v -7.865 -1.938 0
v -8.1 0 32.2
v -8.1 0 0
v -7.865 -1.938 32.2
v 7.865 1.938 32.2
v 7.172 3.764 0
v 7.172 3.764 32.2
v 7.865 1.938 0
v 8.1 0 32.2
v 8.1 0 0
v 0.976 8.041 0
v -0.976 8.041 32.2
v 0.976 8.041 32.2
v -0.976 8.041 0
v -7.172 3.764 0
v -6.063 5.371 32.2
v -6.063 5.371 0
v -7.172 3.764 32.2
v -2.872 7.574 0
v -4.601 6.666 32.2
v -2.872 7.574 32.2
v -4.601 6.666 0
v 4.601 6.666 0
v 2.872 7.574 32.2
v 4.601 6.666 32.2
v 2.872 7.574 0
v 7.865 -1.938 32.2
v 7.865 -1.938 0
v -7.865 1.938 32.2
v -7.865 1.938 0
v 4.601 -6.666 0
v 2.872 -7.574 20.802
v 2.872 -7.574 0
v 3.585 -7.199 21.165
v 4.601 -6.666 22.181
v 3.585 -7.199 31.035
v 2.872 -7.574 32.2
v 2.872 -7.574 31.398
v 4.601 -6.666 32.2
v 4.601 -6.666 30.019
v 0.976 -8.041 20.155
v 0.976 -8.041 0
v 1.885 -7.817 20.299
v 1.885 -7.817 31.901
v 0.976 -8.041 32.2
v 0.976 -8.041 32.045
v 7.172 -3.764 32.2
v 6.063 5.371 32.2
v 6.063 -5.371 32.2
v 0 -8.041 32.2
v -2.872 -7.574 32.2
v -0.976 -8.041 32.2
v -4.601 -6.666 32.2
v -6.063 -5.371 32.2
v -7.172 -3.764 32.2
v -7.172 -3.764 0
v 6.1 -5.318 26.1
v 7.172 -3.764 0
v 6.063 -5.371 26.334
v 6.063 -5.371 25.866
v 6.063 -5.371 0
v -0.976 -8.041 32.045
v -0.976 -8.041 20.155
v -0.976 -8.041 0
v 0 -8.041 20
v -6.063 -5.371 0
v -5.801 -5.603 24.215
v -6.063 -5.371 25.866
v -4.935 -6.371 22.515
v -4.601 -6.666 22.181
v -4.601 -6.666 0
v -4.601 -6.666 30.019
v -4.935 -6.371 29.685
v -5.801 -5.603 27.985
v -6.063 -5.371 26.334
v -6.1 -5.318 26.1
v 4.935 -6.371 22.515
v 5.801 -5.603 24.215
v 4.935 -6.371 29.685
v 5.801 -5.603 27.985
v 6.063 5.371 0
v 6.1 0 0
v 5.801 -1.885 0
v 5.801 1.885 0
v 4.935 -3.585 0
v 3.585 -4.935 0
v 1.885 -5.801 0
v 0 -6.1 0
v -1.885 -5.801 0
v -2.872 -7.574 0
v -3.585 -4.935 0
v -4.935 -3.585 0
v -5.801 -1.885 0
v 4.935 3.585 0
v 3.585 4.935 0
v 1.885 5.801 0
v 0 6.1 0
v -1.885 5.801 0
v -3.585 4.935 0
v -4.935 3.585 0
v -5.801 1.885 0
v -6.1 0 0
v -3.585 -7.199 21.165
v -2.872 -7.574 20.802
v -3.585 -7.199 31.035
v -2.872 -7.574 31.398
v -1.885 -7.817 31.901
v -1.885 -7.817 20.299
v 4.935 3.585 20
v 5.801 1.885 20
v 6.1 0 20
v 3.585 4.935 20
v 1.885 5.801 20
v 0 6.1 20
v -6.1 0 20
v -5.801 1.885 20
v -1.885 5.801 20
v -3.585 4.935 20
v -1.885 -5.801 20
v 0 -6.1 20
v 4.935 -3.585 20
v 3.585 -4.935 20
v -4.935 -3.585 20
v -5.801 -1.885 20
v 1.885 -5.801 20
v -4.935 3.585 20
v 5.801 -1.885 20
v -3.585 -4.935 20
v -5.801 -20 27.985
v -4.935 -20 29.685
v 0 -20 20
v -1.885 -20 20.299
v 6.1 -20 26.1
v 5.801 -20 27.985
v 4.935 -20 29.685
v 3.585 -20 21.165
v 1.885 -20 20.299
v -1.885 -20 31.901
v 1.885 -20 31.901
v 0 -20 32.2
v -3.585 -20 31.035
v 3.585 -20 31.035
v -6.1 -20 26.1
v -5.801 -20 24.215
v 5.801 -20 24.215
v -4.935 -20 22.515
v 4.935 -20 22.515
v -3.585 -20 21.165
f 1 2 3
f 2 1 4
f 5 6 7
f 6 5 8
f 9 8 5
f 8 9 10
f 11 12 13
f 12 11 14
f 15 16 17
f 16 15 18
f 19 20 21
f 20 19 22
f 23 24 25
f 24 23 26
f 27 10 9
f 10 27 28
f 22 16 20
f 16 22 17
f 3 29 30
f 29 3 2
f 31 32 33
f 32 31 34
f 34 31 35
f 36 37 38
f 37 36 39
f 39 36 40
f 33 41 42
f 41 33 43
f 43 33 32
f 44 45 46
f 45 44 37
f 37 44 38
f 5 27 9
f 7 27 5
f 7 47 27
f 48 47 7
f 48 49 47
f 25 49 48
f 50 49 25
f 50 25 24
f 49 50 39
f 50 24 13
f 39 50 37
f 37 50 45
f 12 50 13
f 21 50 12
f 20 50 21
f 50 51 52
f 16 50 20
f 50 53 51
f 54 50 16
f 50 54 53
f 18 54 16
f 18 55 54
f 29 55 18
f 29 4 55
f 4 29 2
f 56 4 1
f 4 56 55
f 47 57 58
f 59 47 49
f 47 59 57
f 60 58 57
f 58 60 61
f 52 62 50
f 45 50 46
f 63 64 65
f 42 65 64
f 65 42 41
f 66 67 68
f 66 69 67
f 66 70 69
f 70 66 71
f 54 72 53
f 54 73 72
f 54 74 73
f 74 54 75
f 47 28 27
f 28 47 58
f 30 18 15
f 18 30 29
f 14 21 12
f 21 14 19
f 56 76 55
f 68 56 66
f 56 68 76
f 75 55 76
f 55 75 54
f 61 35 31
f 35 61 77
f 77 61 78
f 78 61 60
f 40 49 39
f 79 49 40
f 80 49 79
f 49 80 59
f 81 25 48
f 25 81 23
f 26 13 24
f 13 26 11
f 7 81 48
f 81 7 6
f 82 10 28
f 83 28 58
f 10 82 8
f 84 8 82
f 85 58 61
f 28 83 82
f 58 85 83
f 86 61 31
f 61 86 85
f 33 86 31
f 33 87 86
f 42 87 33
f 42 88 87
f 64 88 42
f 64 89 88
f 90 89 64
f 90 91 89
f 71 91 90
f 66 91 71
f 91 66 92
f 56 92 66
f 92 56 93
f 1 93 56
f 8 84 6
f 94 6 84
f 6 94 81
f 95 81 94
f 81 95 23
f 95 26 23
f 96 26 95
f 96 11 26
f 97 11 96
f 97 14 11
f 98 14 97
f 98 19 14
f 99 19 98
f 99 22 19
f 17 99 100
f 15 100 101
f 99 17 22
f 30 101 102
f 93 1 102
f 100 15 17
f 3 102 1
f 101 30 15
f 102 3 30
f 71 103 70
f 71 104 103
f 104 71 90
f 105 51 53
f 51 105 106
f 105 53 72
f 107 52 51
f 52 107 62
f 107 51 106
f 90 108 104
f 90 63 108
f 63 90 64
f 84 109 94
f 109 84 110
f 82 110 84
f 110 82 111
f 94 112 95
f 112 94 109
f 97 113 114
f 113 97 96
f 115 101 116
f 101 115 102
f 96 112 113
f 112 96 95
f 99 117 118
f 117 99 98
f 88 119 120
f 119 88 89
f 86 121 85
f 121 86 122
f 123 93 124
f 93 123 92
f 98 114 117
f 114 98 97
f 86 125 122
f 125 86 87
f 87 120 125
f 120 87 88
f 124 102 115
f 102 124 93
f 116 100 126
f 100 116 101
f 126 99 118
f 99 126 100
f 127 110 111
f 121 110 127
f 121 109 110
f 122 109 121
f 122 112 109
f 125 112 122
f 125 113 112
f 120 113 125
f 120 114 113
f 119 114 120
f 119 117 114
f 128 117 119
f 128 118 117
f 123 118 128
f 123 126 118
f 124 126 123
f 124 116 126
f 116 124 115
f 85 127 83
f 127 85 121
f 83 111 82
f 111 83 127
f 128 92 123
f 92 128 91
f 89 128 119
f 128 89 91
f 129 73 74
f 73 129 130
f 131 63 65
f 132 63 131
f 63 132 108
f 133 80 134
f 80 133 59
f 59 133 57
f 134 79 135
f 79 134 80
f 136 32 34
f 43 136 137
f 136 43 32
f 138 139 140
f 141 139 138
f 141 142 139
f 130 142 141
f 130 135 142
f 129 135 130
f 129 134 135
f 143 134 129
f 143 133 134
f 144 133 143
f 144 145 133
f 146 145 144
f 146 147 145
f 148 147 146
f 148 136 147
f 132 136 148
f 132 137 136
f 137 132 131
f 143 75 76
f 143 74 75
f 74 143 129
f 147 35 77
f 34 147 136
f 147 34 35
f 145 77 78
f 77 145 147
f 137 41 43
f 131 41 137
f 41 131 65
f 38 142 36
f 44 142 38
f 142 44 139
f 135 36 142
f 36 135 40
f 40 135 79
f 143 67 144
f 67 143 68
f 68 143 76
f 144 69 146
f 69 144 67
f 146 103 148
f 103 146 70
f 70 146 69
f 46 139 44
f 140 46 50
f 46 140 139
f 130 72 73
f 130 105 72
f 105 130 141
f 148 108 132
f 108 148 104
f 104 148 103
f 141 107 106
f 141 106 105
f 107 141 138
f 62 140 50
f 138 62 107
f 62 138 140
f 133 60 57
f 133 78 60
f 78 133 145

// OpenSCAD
// all units in mm

$h = 20;
$rod_r = 6.1;
$thickness = 2;

union() {
	difference() {
		cylinder(h = $h+$rod_r*2, r = $rod_r+$thickness);
		cylinder(h = $h, r = $rod_r);
	}
	translate([0, 0, $h+$rod_r]) {
		rotate([90, 0, 0]) {
			cylinder(h = $h, r = $rod_r);
		}
	}
}
